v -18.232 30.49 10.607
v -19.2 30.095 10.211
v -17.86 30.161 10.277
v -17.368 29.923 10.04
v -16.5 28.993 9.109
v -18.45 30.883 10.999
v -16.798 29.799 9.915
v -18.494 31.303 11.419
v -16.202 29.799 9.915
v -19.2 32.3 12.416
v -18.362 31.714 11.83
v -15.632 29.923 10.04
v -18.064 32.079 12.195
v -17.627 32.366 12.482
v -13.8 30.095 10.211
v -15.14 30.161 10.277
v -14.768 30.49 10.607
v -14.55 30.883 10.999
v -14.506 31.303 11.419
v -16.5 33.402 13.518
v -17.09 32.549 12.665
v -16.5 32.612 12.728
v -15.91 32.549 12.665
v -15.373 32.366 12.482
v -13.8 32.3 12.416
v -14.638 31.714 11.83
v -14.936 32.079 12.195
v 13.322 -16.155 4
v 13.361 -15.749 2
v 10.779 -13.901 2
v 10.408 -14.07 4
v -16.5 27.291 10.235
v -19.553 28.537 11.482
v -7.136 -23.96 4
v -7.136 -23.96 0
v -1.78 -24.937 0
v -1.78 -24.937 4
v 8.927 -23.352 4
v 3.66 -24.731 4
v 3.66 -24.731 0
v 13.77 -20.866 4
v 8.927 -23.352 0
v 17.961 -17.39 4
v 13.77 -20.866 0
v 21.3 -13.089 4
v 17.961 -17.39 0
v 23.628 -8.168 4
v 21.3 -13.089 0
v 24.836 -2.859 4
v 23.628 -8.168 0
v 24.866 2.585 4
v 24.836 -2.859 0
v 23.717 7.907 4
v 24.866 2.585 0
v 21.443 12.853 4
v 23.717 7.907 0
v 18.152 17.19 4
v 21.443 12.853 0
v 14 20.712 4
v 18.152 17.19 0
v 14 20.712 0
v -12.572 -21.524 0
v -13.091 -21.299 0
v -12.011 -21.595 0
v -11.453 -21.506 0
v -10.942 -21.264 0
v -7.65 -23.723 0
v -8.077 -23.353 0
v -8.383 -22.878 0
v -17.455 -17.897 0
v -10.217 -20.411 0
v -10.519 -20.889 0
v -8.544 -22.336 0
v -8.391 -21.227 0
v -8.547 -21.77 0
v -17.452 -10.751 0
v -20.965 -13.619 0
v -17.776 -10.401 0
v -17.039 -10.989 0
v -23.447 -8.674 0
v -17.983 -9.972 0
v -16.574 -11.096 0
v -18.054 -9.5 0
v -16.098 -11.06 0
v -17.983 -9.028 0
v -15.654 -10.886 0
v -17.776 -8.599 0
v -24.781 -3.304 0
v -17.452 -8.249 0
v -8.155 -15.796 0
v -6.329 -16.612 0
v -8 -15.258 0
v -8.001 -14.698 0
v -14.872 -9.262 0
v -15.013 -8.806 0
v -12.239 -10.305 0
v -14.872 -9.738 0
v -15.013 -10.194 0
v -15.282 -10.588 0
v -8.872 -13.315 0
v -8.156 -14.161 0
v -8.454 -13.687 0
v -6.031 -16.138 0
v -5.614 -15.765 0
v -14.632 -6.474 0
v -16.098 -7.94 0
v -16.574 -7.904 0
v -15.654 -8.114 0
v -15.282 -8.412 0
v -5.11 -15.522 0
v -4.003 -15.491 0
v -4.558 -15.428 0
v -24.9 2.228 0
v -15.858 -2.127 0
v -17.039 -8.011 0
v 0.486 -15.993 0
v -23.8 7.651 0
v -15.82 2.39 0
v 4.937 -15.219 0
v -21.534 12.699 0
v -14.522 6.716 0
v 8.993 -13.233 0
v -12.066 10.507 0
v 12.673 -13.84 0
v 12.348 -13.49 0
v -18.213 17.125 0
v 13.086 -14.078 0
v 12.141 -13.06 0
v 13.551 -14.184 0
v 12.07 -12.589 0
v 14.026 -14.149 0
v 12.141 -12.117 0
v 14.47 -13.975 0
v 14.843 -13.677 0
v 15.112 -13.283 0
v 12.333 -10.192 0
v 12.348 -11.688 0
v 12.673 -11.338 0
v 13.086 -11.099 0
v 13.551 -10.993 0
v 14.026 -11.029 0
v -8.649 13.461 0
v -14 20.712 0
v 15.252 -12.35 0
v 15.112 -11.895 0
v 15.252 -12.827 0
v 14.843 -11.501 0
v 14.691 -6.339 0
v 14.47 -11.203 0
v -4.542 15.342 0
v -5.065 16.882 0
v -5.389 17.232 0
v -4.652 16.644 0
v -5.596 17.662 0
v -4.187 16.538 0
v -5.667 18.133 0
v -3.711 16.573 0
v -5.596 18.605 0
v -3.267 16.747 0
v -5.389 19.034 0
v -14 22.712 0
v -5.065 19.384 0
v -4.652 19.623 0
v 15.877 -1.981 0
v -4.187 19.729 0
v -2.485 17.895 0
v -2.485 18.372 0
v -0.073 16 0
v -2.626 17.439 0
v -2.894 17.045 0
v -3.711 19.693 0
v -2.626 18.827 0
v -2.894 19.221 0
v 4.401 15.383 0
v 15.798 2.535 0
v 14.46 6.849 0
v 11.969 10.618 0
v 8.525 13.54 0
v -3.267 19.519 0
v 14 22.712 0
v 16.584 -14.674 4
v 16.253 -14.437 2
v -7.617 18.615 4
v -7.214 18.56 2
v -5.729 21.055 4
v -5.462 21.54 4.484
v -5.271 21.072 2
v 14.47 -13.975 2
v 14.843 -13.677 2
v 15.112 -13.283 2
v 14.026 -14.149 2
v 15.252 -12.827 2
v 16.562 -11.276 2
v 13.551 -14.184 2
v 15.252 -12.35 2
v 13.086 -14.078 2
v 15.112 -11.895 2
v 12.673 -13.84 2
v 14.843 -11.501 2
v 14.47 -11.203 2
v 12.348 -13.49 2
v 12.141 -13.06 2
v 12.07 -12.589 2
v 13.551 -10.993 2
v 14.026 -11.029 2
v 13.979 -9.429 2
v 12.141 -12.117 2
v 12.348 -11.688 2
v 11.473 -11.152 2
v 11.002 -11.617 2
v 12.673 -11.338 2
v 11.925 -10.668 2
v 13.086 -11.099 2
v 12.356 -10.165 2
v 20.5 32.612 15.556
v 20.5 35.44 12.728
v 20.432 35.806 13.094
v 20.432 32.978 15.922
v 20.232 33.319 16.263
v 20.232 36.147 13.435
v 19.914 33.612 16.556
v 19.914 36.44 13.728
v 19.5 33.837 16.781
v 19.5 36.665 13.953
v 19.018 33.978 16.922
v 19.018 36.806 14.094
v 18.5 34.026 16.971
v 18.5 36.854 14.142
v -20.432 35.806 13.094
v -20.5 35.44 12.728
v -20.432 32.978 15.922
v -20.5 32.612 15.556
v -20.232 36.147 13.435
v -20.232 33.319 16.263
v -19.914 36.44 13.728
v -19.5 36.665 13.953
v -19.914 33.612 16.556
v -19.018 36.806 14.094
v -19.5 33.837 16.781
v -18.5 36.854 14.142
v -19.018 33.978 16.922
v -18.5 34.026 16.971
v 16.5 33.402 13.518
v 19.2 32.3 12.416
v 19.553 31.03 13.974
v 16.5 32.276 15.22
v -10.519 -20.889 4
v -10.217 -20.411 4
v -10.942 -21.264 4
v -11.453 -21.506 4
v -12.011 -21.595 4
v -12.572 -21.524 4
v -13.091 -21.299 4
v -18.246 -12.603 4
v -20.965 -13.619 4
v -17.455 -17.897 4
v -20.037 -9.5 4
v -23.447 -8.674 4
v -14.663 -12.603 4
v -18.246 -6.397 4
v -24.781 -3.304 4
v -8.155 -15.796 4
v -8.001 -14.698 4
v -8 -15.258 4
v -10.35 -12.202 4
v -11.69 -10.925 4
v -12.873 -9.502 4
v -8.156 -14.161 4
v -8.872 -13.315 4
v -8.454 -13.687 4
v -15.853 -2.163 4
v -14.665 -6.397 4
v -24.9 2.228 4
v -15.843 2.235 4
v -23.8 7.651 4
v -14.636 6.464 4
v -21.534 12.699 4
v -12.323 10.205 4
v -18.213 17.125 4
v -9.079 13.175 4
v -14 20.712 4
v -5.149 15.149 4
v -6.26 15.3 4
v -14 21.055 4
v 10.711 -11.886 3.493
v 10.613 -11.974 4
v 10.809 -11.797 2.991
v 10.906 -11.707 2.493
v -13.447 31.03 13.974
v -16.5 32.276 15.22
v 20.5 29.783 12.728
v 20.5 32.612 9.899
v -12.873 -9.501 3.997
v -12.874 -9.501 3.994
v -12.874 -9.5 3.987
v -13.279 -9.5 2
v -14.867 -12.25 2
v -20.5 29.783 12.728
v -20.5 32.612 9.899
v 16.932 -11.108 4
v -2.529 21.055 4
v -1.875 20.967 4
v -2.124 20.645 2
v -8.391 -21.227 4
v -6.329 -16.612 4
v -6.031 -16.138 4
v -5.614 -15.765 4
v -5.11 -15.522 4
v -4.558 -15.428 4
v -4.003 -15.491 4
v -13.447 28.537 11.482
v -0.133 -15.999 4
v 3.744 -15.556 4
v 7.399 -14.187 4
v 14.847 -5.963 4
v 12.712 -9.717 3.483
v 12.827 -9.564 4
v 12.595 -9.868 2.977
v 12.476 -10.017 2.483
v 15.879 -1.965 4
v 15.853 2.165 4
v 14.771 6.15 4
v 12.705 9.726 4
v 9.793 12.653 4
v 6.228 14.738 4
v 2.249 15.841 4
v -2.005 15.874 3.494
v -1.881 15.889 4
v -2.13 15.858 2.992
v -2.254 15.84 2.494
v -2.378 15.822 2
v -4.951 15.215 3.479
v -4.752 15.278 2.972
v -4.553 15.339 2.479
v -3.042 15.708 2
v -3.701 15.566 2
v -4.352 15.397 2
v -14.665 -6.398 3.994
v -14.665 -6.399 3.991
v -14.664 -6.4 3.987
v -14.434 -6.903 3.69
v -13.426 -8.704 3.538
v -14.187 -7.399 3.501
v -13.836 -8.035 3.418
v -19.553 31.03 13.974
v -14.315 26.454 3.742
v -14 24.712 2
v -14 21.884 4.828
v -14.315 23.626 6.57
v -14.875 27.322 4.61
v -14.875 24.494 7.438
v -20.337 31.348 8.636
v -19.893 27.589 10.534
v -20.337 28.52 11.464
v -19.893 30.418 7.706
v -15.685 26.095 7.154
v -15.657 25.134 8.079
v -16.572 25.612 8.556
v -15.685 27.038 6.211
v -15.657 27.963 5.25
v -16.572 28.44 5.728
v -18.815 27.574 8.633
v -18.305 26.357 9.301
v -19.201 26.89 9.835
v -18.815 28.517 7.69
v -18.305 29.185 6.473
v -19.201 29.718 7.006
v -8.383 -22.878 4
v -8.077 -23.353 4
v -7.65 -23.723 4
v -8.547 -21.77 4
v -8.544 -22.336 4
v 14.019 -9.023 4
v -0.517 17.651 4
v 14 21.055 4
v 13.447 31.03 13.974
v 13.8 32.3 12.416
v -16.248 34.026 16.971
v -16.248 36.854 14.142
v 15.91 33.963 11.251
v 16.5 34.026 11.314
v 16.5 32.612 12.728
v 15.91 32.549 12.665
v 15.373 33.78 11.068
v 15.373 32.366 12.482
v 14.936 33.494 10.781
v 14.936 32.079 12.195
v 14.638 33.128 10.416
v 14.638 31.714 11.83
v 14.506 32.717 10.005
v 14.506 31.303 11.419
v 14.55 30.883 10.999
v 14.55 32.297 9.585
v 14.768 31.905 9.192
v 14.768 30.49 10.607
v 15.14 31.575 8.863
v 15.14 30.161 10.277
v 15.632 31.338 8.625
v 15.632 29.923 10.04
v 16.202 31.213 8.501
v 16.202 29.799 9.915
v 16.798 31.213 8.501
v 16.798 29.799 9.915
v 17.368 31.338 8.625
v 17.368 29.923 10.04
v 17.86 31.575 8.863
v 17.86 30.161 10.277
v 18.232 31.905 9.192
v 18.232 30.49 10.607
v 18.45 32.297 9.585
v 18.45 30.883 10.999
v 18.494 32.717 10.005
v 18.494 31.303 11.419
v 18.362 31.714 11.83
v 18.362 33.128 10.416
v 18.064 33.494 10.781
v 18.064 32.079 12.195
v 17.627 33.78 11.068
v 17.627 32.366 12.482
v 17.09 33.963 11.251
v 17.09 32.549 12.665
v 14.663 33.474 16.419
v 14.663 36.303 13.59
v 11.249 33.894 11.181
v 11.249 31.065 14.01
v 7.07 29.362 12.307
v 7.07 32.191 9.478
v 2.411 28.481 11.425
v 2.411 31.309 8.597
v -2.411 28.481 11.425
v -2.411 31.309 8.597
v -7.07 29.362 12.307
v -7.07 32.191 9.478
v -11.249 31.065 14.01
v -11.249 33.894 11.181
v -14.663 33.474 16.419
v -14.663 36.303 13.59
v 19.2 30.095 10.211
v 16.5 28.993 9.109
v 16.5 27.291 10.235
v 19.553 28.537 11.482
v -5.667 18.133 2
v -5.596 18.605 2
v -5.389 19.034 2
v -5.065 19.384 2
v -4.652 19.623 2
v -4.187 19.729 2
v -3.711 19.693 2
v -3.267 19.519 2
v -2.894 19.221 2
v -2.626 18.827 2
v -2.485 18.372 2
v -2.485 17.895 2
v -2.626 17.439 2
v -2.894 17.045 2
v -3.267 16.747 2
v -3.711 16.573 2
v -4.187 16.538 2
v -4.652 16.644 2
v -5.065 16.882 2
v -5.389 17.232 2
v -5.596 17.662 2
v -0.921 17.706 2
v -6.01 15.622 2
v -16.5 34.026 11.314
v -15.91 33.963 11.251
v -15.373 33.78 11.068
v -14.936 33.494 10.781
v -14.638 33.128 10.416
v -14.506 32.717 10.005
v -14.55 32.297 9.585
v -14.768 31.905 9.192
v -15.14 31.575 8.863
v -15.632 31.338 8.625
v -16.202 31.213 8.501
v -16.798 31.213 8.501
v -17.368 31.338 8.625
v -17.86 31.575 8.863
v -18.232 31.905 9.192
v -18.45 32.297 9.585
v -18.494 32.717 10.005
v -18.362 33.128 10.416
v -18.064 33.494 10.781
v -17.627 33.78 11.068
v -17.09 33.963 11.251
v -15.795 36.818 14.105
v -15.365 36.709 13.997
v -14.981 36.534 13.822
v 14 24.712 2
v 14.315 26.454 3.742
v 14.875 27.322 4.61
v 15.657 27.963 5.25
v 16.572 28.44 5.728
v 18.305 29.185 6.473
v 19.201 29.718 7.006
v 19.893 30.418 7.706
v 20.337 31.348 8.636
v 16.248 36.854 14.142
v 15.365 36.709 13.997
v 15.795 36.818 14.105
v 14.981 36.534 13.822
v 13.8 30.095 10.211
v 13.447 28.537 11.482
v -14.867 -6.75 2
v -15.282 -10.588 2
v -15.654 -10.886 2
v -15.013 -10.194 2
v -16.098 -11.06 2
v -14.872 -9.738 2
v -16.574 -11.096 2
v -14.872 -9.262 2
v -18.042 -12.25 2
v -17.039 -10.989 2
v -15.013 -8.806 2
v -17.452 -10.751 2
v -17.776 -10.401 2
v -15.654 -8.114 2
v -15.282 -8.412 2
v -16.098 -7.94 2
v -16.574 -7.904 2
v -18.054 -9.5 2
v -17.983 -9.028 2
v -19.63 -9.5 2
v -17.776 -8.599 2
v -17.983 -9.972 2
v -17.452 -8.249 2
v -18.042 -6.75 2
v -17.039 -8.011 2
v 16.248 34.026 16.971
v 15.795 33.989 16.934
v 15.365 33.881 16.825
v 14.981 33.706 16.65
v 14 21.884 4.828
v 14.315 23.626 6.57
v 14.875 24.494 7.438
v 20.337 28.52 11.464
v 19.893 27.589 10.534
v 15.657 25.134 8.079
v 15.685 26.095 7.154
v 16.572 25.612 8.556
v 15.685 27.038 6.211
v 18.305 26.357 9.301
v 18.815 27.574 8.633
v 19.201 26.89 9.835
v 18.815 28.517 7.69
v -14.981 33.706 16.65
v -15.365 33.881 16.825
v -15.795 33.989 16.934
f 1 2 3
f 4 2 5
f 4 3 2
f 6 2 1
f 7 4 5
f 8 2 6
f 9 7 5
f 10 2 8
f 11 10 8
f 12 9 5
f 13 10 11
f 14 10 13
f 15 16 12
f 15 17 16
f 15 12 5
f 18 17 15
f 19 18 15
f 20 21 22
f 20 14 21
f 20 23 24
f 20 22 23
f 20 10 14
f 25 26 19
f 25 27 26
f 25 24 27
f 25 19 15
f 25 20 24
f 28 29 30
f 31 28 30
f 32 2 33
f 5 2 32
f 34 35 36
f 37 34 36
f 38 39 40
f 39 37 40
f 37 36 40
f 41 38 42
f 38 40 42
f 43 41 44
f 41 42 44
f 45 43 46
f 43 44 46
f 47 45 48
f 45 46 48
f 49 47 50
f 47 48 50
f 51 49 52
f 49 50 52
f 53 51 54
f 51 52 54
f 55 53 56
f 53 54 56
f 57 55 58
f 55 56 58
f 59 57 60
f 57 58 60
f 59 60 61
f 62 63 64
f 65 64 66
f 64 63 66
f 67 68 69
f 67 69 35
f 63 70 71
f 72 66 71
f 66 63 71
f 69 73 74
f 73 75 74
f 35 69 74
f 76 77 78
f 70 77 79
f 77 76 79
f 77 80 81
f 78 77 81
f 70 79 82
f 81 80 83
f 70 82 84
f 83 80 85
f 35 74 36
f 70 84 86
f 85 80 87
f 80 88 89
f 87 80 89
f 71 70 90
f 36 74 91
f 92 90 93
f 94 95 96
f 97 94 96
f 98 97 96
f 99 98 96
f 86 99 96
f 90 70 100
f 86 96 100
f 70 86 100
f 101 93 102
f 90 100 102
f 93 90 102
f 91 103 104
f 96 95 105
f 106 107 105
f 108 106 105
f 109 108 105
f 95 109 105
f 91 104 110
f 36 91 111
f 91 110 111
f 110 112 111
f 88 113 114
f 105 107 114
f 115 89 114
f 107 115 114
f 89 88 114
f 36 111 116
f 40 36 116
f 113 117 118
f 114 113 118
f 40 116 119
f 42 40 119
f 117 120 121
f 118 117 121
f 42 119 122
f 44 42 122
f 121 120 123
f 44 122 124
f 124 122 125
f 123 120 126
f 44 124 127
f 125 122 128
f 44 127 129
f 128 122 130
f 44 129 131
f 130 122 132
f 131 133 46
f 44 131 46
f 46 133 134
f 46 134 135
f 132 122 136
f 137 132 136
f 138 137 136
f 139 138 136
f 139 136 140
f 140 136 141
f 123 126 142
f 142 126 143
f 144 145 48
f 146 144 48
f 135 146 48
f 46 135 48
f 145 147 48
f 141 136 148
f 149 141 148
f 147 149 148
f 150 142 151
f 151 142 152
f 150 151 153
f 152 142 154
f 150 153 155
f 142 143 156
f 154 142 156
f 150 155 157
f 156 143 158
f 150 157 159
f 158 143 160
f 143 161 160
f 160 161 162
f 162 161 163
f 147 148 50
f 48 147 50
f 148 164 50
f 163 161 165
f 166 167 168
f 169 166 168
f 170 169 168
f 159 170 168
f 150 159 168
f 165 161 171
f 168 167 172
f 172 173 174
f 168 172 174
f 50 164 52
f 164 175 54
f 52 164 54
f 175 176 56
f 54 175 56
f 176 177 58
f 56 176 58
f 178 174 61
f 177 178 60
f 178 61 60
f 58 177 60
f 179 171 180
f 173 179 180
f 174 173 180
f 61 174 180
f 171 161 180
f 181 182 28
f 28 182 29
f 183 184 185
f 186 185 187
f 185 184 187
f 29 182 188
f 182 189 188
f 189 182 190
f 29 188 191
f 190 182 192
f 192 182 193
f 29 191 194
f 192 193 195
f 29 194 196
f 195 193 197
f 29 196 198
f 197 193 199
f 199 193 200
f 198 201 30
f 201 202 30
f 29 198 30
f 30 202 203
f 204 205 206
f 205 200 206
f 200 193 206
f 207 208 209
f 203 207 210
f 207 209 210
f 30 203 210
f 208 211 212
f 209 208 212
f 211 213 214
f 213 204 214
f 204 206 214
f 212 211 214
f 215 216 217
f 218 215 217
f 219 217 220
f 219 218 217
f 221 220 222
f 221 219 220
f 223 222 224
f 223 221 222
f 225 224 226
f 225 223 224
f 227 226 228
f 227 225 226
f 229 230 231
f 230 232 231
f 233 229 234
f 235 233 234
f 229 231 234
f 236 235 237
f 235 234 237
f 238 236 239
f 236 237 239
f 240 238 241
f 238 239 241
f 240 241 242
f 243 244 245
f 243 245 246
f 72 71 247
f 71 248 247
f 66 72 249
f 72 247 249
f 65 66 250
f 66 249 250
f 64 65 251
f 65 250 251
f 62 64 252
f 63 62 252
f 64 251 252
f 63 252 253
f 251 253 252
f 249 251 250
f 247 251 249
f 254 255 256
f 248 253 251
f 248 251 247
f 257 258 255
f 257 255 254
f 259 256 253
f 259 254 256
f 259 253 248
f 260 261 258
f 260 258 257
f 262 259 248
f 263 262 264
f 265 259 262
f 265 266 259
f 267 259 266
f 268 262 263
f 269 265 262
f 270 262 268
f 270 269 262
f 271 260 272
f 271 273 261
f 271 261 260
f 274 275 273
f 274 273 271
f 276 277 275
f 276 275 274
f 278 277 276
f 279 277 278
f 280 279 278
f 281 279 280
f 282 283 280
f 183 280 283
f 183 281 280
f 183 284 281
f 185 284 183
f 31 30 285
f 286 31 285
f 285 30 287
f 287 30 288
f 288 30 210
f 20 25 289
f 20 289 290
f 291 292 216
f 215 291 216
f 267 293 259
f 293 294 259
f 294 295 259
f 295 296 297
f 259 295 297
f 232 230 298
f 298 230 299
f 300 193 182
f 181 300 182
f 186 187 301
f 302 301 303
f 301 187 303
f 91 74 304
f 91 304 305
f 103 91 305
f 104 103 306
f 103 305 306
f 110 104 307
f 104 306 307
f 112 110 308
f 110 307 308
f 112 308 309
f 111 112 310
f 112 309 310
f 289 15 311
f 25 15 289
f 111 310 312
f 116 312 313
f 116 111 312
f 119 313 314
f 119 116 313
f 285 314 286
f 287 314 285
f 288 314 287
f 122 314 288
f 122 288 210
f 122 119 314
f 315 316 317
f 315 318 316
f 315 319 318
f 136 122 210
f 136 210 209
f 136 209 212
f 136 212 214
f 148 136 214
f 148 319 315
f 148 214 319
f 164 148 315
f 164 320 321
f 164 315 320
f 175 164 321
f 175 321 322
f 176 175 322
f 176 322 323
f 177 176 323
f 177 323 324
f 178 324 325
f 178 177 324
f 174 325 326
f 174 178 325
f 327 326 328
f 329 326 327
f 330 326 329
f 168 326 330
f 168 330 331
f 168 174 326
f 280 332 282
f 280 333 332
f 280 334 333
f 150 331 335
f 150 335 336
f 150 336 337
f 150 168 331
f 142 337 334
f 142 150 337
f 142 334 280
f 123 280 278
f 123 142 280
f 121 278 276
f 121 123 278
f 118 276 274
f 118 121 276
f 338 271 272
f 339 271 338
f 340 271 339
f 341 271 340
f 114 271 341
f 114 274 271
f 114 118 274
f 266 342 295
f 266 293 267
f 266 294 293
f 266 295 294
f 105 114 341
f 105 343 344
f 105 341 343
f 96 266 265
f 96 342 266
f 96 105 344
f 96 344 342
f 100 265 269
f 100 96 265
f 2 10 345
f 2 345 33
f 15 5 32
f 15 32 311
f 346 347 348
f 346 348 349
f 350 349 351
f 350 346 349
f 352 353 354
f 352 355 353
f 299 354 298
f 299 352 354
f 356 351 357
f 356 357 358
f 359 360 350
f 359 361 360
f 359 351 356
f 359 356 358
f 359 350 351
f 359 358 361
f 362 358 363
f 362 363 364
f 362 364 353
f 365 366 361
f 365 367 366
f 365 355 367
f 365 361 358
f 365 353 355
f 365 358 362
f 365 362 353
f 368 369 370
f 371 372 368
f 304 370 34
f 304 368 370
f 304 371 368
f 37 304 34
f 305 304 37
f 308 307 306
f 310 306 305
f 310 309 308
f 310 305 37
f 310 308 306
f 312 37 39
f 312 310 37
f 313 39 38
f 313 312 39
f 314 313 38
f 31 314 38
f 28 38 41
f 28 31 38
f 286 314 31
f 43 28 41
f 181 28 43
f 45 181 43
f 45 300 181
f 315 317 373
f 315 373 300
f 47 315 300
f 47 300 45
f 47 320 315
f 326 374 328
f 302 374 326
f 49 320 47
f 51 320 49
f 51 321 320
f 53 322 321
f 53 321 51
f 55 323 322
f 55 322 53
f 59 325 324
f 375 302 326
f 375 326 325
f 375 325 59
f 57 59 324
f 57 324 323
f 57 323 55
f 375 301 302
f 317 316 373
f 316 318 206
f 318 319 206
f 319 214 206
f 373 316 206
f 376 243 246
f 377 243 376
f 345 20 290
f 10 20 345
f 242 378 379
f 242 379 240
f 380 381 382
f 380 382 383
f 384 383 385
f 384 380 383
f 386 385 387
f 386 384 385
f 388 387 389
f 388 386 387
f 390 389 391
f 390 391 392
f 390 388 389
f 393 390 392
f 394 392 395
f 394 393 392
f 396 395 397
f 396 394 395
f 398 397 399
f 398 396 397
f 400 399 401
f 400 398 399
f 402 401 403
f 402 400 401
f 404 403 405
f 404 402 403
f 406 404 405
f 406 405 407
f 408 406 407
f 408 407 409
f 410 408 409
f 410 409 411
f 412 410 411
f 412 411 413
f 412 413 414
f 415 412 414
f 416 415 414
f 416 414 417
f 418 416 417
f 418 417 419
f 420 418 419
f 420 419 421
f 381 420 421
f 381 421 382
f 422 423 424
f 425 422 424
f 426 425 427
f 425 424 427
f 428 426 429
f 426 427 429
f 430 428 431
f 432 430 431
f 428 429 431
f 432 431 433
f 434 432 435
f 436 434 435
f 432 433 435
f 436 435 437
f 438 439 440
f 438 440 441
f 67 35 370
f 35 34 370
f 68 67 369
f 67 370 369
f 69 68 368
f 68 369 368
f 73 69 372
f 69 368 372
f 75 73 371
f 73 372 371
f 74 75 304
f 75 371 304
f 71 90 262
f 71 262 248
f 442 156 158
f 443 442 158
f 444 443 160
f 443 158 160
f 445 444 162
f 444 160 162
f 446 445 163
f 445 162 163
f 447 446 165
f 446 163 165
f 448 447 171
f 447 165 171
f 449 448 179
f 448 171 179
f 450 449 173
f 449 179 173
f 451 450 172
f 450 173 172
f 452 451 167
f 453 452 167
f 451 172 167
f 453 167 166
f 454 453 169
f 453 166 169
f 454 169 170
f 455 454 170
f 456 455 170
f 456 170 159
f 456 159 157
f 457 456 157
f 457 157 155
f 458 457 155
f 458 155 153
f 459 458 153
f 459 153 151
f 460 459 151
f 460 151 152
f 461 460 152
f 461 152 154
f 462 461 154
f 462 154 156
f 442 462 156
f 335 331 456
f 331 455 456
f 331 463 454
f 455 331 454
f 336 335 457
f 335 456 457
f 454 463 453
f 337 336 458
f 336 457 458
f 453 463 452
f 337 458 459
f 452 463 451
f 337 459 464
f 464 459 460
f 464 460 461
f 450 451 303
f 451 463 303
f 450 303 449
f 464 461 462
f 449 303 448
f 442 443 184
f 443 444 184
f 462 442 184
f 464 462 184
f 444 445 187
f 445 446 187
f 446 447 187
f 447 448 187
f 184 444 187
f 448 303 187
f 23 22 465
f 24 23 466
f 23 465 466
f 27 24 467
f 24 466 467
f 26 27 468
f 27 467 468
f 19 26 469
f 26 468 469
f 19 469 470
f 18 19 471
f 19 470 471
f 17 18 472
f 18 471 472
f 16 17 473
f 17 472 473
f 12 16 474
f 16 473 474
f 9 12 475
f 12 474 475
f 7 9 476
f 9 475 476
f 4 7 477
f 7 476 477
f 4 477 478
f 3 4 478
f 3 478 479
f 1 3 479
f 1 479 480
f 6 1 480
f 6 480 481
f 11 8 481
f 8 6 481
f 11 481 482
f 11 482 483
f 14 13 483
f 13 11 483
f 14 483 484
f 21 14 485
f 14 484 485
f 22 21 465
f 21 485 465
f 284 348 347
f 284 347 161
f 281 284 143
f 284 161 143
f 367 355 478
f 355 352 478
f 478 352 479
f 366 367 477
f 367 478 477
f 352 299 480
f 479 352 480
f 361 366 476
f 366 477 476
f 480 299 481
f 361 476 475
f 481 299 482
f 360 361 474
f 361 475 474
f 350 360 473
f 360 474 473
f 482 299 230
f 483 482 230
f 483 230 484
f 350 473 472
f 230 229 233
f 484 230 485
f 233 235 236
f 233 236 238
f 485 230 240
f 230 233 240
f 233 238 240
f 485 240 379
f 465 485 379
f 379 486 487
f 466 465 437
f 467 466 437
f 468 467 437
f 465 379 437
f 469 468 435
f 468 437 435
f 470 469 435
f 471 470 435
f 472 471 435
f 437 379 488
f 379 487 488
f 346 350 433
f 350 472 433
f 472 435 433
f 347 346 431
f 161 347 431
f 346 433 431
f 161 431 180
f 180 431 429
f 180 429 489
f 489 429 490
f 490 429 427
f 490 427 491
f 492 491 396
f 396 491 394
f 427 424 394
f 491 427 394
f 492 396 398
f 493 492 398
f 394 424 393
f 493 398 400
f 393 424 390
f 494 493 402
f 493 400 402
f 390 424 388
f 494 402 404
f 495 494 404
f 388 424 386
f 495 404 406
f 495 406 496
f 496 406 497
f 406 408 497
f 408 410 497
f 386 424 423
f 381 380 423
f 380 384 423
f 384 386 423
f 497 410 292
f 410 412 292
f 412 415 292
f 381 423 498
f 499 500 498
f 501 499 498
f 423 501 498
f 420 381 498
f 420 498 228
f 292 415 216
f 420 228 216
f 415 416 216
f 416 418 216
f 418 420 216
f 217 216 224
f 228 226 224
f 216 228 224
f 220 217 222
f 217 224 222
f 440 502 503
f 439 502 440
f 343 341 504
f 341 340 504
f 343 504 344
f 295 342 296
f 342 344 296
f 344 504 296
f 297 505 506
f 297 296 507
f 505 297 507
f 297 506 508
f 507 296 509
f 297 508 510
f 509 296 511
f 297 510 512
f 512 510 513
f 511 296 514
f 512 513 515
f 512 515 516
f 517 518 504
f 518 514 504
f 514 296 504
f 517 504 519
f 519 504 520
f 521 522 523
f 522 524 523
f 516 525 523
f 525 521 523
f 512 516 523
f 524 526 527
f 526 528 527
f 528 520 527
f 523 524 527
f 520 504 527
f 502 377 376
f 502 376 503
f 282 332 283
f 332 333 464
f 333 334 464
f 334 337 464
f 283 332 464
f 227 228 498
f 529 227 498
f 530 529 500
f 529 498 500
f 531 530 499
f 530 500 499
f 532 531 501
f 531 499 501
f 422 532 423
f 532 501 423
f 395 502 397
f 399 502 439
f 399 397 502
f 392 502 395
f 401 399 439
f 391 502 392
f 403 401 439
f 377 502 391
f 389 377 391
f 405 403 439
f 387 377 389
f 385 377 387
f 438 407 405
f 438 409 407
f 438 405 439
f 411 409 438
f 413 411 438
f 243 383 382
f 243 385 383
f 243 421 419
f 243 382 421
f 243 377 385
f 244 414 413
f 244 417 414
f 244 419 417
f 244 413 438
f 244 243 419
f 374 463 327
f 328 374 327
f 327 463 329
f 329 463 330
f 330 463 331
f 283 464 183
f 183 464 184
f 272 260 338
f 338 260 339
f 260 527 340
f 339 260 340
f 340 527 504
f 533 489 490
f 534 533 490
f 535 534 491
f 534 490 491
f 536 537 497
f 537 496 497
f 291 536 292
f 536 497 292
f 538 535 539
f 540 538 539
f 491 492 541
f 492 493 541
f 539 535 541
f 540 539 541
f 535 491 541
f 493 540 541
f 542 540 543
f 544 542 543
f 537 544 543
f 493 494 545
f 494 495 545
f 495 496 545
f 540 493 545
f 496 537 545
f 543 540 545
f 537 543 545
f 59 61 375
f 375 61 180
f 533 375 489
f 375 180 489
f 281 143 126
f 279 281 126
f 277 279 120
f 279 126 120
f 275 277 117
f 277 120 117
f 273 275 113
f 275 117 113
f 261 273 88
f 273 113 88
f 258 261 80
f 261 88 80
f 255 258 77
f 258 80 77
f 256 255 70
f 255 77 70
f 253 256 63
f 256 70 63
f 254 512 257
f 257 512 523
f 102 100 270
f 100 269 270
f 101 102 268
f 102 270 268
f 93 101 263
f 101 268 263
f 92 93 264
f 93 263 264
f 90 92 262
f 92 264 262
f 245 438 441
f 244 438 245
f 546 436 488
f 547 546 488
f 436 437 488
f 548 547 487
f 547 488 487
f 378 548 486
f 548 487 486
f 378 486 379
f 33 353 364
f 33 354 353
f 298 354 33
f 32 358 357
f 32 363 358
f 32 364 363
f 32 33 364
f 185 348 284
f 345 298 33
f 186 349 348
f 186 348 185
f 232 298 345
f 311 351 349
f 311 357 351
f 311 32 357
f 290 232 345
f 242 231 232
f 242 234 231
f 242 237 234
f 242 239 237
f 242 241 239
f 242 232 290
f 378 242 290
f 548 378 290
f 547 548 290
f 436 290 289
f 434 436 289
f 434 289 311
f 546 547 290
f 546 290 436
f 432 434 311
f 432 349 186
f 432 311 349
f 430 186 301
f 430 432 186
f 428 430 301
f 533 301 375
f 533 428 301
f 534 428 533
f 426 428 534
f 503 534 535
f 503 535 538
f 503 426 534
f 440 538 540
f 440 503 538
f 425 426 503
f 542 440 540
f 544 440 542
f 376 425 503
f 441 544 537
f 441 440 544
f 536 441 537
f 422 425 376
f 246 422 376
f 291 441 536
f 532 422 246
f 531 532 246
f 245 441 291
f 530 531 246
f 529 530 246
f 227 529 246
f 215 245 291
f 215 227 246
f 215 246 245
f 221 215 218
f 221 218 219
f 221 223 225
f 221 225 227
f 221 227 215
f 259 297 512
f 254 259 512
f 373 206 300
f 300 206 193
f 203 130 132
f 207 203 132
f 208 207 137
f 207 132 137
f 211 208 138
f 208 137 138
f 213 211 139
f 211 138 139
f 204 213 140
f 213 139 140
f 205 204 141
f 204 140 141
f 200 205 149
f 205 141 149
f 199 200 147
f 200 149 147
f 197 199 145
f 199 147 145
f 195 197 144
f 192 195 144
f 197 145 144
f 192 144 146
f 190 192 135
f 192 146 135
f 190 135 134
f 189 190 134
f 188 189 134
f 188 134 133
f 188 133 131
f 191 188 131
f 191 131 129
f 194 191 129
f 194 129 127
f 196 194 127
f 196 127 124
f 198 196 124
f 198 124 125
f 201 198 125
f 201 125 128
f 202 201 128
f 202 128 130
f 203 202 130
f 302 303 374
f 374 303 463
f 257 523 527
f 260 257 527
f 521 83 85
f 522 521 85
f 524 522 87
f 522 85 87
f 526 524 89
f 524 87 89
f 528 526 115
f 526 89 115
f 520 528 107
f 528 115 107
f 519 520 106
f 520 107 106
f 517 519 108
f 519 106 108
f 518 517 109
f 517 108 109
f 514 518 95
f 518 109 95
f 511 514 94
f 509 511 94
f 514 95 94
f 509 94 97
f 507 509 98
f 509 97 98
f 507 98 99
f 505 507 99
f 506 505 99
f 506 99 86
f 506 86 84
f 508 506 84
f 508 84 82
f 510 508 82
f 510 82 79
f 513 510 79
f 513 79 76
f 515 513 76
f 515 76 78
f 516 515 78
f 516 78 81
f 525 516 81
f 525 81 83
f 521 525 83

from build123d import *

# Parameters (mm, degrees)
SKETCH1_R                = 25
SKETCH1_R_2              = 16
BOSS_EXTRUDE1_DEPTH      = 4
SKETCH2_R                = 1.6
CUT_EFFECTOR_HOLES_DEPTH = 36.580893749
SKETCH10_W               = 28
SKETCH10_H               = 4.287684823
CUT_EXTRUDE6_DEPTH       = 36.580893749
SKETCH3_W                = 28
SKETCH3_H                = 2
BOSS_FAN_EXTENSION_DEPTH = 4
BOSS_FAN_BOSS_DEPTH      = 4
CUT_FAN_SCREW_REACH      = 54.433
SKETCH5_R                = 2
CUT_FAN_HOLE_REACH       = 54.433
SKETCH6_R                = 18.5
FILLET1_R                = 2
CUT_EXTRUDE4_OUTLINE_R   = 1.6
CUT_EXTRUDE4_DEPTH       = 2
CUT_EXTRUDE4_DRAFT       = 10
CUT_EXTRUDE4_2_OUTLINE_R = 1.6
CUT_EXTRUDE4_2_DEPTH     = 2.484285969
CUT_EXTRUDE4_2_DRAFT     = 10
CUT_EXTRUDE4_3_OUTLINE_R = 1.6
CUT_EXTRUDE4_3_DEPTH     = 2
CUT_EXTRUDE4_3_DRAFT     = 10
CUT_EXTRUDE5_REACH       = 49.658
FILLET2_R                = 2
CUT_EXTRUDE7_DEPTH       = 2
CUT_EXTRUDE7_DRAFT       = -10
CUT_EXTRUDE7_2_DEPTH     = 2
CUT_EXTRUDE7_2_DRAFT     = -10


# Read off the part's stored shape, not the designer's step: Cut-Extrude4, Cut-Extrude7
with BuildPart() as part:
    # Sketch1 → Boss-Extrude1 (new body)
    with BuildSketch(Plane.XY):
        Circle(SKETCH1_R)
        Circle(SKETCH1_R_2, mode=Mode.SUBTRACT)
    extrude(amount=BOSS_EXTRUDE1_DEPTH)

    # Sketch2 → Cut-Effector Holes (cut, through all)
    with BuildSketch(Plane(origin=(0, 0, 0), x_dir=(-1, 0, 0), z_dir=(0, 0, -1))):
        with Locations((4.067203991, 18.133126642)):
            Circle(SKETCH2_R)
        with Locations((-13.670146326, -12.588865299)):
            Circle(SKETCH2_R)
        with Locations((16.454482672, -9.5)):
            Circle(SKETCH2_R)
    extrude(amount=-CUT_EFFECTOR_HOLES_DEPTH, mode=Mode.SUBTRACT)

    # Sketch10 → Cut-Extrude6 (cut, through all)
    with BuildSketch(Plane(origin=(0, 0, 0), x_dir=(-1, 0, 0), z_dir=(0, 0, -1))):
        with Locations((0, 22.856157589)):
            Rectangle(SKETCH10_W, SKETCH10_H)
    extrude(amount=-CUT_EXTRUDE6_DEPTH, mode=Mode.SUBTRACT)

    # Sketch3 → Boss-Fan Extension (add, through all)
    with BuildSketch(Plane.XY):
        with Locations((0, 21.712315177)):
            Rectangle(SKETCH3_W, SKETCH3_H)
    extrude(amount=BOSS_FAN_EXTENSION_DEPTH)

    # Sketch4 → Boss-Fan Boss (add)
    with BuildSketch(Plane(origin=(0, 11.356157589, -11.356157589), x_dir=(-1, 0, 0), z_dir=(0, 0.7071067811865464, -0.7071067811865488))):
        with BuildLine():
            Line((-20.5, 30.060032078), (-20.5, 36.060032078))
            Line((-20.5, 36.060032078), (20.5, 36.060032078))
            Line((20.5, 36.060032078), (20.5, 30.060032078))
            add(Edge.make_bspline(
                [(14, 18.888459203), (14, 26.407165397), (20.5, 22.786539918), (20.5, 30.060032078)],
                knots=[0, 0, 0, 0, 1, 1, 1, 1], degree=3))
            Line((14, 18.888459203), (14, 16.060032078))
            Line((14, 16.060032078), (-14, 16.060032078))
            Line((-14, 16.060032078), (-14, 18.888459203))
            add(Edge.make_bspline(
                [(-14, 18.888459203), (-14, 26.407165397), (-20.5, 22.786539918), (-20.5, 30.060032078)],
                knots=[0, 0, 0, 0, 1, 1, 1, 1], degree=3))
        make_face()
    extrude(amount=-BOSS_FAN_BOSS_DEPTH)

    # Sketch5 → Cut-Fan Screw (cut, up to next)
    with BuildSketch(Plane(origin=(0, 11.356157589, -11.356157589), x_dir=(1, 0, 0), z_dir=(0, 0.7071067811865466, -0.7071067811865485)), mode=Mode.PRIVATE) as cut_fan_screw_sk1:
        with Locations(Location((-16.5, -30.060032078, 0), (0, 0, 270))):
            Circle(SKETCH5_R)
    cut_fan_screw_tool1 = extrude(cut_fan_screw_sk1.sketch, amount=-CUT_FAN_SCREW_REACH, mode=Mode.PRIVATE) & part.part
    cut_fan_screw = cut_fan_screw_tool1.solids().sort_by_distance((-16.5, 32.61181, 9.899495))[0]
    add(cut_fan_screw, mode=Mode.SUBTRACT)

    # Mirror-Fan Screw: Cut-Fan Screw across plane
    add(cut_fan_screw.mirror(Plane(origin=(0, 0, 0), x_dir=(0, 0, 1), z_dir=(1, 0, 0))), mode=Mode.SUBTRACT)

    # Sketch6 → Cut-Fan Hole (cut, up to next)
    with BuildSketch(Plane(origin=(0, 11.356157589, -11.356157589), x_dir=(1, 0, 0), z_dir=(0, 0.7071067811865466, -0.7071067811865485)), mode=Mode.PRIVATE) as cut_fan_hole_sk1:
        with Locations((0, -46.560032078)):
            Circle(SKETCH6_R)
    cut_fan_hole_tool1 = extrude(cut_fan_hole_sk1.sketch, amount=-CUT_FAN_HOLE_REACH, mode=Mode.PRIVATE) & part.part
    add(cut_fan_hole_tool1.solids().sort_by_distance((0, 44.279072, 21.566757))[0], mode=Mode.SUBTRACT)

    # Fillet1
    fillet1_edges = [part.edges().sort_by_distance(p)[0] for p in [
        (20.5, 35.440237239, 15.556349186),
        (-20.5, 35.440237239, 15.556349186),
        (15.231546212, 35.440237239, 15.556349186),
        (-15.231546212, 35.440237239, 15.556349186),
    ]]
    fillet(fillet1_edges, radius=FILLET1_R)


with BuildPart() as cut_extrude4_tool:
    # Cut-Extrude4 outline → Cut-Extrude4 (with draft: the straight prism first)
    with BuildSketch(Plane(origin=(0, 0, 2), x_dir=(-1, 0, 0), z_dir=(0, 0, -1))):
        with BuildLine():
            ThreePointArc((-11.002045698, -11.617012975), (-11.701394046, -10.912258124), (-12.355684371, -10.165483939))
            Line((-12.355684371, -10.165483939), (-13.979106464, -9.42850504))
            Line((-13.979106464, -9.42850504), (-16.561578664, -11.276252498))
            Line((-16.561578664, -11.276252498), (-16.252618527, -14.436612757))
            Line((-16.252618527, -14.436612757), (-13.361186189, -15.749225558))
            Line((-13.361186189, -15.749225558), (-10.778713988, -13.901478101))
            Line((-10.778713988, -13.901478101), (-11.002045698, -11.617012975))
        make_face()
        with Locations((-13.670146326, -12.588865299)):
            Circle(CUT_EXTRUDE4_OUTLINE_R, mode=Mode.SUBTRACT)
    extrude(amount=-CUT_EXTRUDE4_DEPTH)
    # Cut-Extrude4: the draft: its side faces are tilted about the plane it starts from
    cut_extrude4_sides = [cut_extrude4_tool.faces().sort_by_distance(p)[0] for p in [
        (16.407098595, -12.856432627, 3),
        (14.806902358, -15.092919158, 3),
        (12.069950089, -14.825351829, 3),
        (10.890379843, -12.759245538, 3),
        (11.701394046, -10.912258124, 3),
        (13.167395417, -9.796994489, 3),
        (15.270342564, -10.352378769, 3),
        (15.270146326, -12.588865299, 3),
    ]]
    draft(cut_extrude4_sides, Plane(origin=(0, 0, 2), x_dir=(-1, 0, 0), z_dir=(0, 0, -1)), CUT_EXTRUDE4_DRAFT)


with BuildPart() as part_1:
    add(part.part)

    # Cut-Extrude4: cut by cut_extrude4_tool
    add(cut_extrude4_tool.part, mode=Mode.SUBTRACT)


with BuildPart() as cut_extrude4_2_tool:
    # Cut-Extrude4 2 outline → Cut-Extrude4 2 (with draft: the straight prism first)
    with BuildSketch(Plane(origin=(0, 0, 2), x_dir=(-1, 0, 0), z_dir=(0, 0, -1))):
        with BuildLine():
            ThreePointArc((2.378102624, 15.822282639), (3.371999625, 15.640639965), (4.352450444, 15.396628694))
            Line((4.352450444, 15.396628694), (6.010326315, 15.621631277))
            Line((6.010326315, 15.621631277), (7.21378394, 18.560172255))
            Line((7.21378394, 18.560172255), (5.270661616, 21.071667619))
            Line((5.270661616, 21.071667619), (2.124081667, 20.644622006))
            Line((2.124081667, 20.644622006), (0.920624042, 17.706081029))
            Line((0.920624042, 17.706081029), (2.378102624, 15.822282639))
        make_face()
        with Locations((4.067203991, 18.133126642)):
            Circle(CUT_EXTRUDE4_2_OUTLINE_R, mode=Mode.SUBTRACT)
    extrude(amount=-CUT_EXTRUDE4_2_DEPTH)
    # Cut-Extrude4 2: the draft: its side faces are tilted about the plane it starts from
    cut_extrude4_2_sides = [cut_extrude4_2_tool.faces().sort_by_distance(p)[0] for p in [
        (-6.242222778, 19.815919937, 3.242142985),
        (-3.697371642, 20.858144812, 3.242142985),
        (-1.522352855, 19.175351517, 3.242142985),
        (-1.649363333, 16.764181834, 3.242142985),
        (-3.371999625, 15.640639965, 3.242142985),
        (-5.18138838, 15.509129986, 3.242142985),
        (-6.612055127, 17.090901766, 3.242142985),
        (-2.467203991, 18.133126642, 3.242142985),
    ]]
    draft(cut_extrude4_2_sides, Plane(origin=(0, 0, 2), x_dir=(-1, 0, 0), z_dir=(0, 0, -1)), CUT_EXTRUDE4_2_DRAFT)


with BuildPart() as part_2:
    add(part_1.part)

    # Cut-Extrude4 2: cut by cut_extrude4_2_tool
    add(cut_extrude4_2_tool.part, mode=Mode.SUBTRACT)


with BuildPart() as cut_extrude4_3_tool:
    # Cut-Extrude4 3 outline → Cut-Extrude4 3 (with draft: the straight prism first)
    with BuildSketch(Plane(origin=(0, 0, 2), x_dir=(-1, 0, 0), z_dir=(0, 0, -1))):
        Polygon((18.042195912, -6.75), (14.866769432, -6.75), (13.279056191, -9.5), (14.866769432, -12.25), (18.042195912, -12.25), (19.629909152, -9.5), align=None)
        with Locations((16.454482672, -9.5)):
            Circle(CUT_EXTRUDE4_3_OUTLINE_R, mode=Mode.SUBTRACT)
    extrude(amount=-CUT_EXTRUDE4_3_DEPTH)
    # Cut-Extrude4 3: the draft: its side faces are tilted about the plane it starts from
    cut_extrude4_3_sides = [cut_extrude4_3_tool.faces().sort_by_distance(p)[0] for p in [
        (-16.454482672, -6.75, 3),
        (-14.072912812, -8.125, 3),
        (-14.072912812, -10.875, 3),
        (-16.454482672, -12.25, 3),
        (-18.836052532, -10.875, 3),
        (-18.836052532, -8.125, 3),
        (-14.854482672, -9.5, 3),
    ]]
    draft(cut_extrude4_3_sides, Plane(origin=(0, 0, 2), x_dir=(-1, 0, 0), z_dir=(0, 0, -1)), CUT_EXTRUDE4_3_DRAFT)


with BuildPart() as part_3:
    add(part_2.part)

    # Cut-Extrude4 3: cut by cut_extrude4_3_tool
    add(cut_extrude4_3_tool.part, mode=Mode.SUBTRACT)

    # Sketch8 → Cut-Extrude5 (cut, up to next)
    with BuildSketch(Plane(origin=(0, 0, 0), x_dir=(-1, 0, 0), z_dir=(0, 0, -1)), mode=Mode.PRIVATE) as cut_extrude5_sk1:
        with BuildLine():
            Line((9.279528916, -23.214011784), (5.602690803, -14.98698955))
            Line((5.602690803, -14.98698955), (7.428630962, -14.170936526))
            Line((7.428630962, -14.170936526), (11.105469075, -22.39795876))
            ThreePointArc((11.105469075, -22.39795876), (10.200662793, -22.824251983), (9.279528916, -23.214011784))
        make_face()
    cut_extrude5_tool1 = extrude(cut_extrude5_sk1.sketch, amount=-CUT_EXTRUDE5_REACH, mode=Mode.PRIVATE) & part_3.part
    add(cut_extrude5_tool1.solids().sort_by_distance((-8.356802, -18.698565, 0))[0], mode=Mode.SUBTRACT)

    # Fillet2
    fillet2_edges = [part_3.edges().sort_by_distance(p)[0] for p in [
        (-11.105469075, -22.39795876, 2),
        (-5.602690803, -14.98698955, 2),
        (-9.279528916, -23.214011784, 2),
        (-7.428630962, -14.170936526, 2),
    ]]
    fillet(fillet2_edges, radius=FILLET2_R)


with BuildPart() as cut_extrude7_tool:
    # Cut-Extrude7 outline → Cut-Extrude7 (with draft: the straight prism first)
    with BuildSketch(Plane(origin=(0, 9.941944026, -9.941944026), x_dir=(1, 0, 0), z_dir=(0, -0.7071067811865462, 0.7071067811865488))):
        Polygon((-13.8, 28.501186351), (-13.8, 31.618877805), (-16.5, 33.177723532), (-19.2, 31.618877805), (-19.2, 28.501186351), (-16.5, 26.942340625), align=None)
        with BuildLine():
            ThreePointArc((-16.5, 32.060032078), (-14.5, 30.060032078), (-16.5, 28.060032078))
            ThreePointArc((-16.5, 28.060032078), (-18.5, 30.060032078), (-16.5, 32.060032078))
        make_face(mode=Mode.SUBTRACT)
    extrude(amount=CUT_EXTRUDE7_DEPTH)
    # Cut-Extrude7: the draft: its side faces are tilted about the plane it starts from
    cut_extrude7_sides = [cut_extrude7_tool.faces().sort_by_distance(p)[0] for p in [
        (-13.8, 30.49048977, 12.02081528),
        (-16.5, 29.076276207, 10.606601718),
        (-17.85, 28.837084194, 10.367409704),
        (-19.2, 30.49048977, 12.02081528),
        (-17.85, 32.143895346, 13.674220857),
        (-15.15, 32.143895346, 13.674220857),
        (-15.15, 28.837084194, 10.367409704),
    ]]
    draft(cut_extrude7_sides, Plane(origin=(0, 9.941944026, -9.941944026), x_dir=(1, 0, 0), z_dir=(0, -0.7071067811865462, 0.7071067811865488)), CUT_EXTRUDE7_DRAFT)


with BuildPart() as part_4:
    add(part_3.part)

    # Cut-Extrude7: cut by cut_extrude7_tool
    add(cut_extrude7_tool.part, mode=Mode.SUBTRACT)


with BuildPart() as cut_extrude7_2_tool:
    # Cut-Extrude7 2 outline → Cut-Extrude7 2 (with draft: the straight prism first)
    with BuildSketch(Plane(origin=(0, 9.941944026, -9.941944026), x_dir=(1, 0, 0), z_dir=(0, -0.7071067811865462, 0.7071067811865488))):
        Polygon((19.2, 28.501186351), (19.2, 31.618877805), (16.5, 33.177723532), (13.8, 31.618877805), (13.8, 28.501186351), (16.5, 26.942340625), align=None)
        with BuildLine():
            ThreePointArc((16.5, 32.060032078), (18.5, 30.060032078), (16.5, 28.060032078))
            ThreePointArc((16.5, 28.060032078), (14.5, 30.060032078), (16.5, 32.060032078))
        make_face(mode=Mode.SUBTRACT)
    extrude(amount=CUT_EXTRUDE7_2_DEPTH)
    # Cut-Extrude7 2: the draft: its side faces are tilted about the plane it starts from
    cut_extrude7_2_sides = [cut_extrude7_2_tool.faces().sort_by_distance(p)[0] for p in [
        (19.2, 30.49048977, 12.02081528),
        (16.5, 29.076276207, 10.606601718),
        (15.15, 28.837084194, 10.367409704),
        (13.8, 30.49048977, 12.02081528),
        (15.15, 32.143895346, 13.674220857),
        (17.85, 32.143895346, 13.674220857),
        (17.85, 28.837084194, 10.367409704),
    ]]
    draft(cut_extrude7_2_sides, Plane(origin=(0, 9.941944026, -9.941944026), x_dir=(1, 0, 0), z_dir=(0, -0.7071067811865462, 0.7071067811865488)), CUT_EXTRUDE7_2_DRAFT)


with BuildPart() as part_5:
    add(part_4.part)

    # Cut-Extrude7 2: cut by cut_extrude7_2_tool
    add(cut_extrude7_2_tool.part, mode=Mode.SUBTRACT)


solid = part_5.part
